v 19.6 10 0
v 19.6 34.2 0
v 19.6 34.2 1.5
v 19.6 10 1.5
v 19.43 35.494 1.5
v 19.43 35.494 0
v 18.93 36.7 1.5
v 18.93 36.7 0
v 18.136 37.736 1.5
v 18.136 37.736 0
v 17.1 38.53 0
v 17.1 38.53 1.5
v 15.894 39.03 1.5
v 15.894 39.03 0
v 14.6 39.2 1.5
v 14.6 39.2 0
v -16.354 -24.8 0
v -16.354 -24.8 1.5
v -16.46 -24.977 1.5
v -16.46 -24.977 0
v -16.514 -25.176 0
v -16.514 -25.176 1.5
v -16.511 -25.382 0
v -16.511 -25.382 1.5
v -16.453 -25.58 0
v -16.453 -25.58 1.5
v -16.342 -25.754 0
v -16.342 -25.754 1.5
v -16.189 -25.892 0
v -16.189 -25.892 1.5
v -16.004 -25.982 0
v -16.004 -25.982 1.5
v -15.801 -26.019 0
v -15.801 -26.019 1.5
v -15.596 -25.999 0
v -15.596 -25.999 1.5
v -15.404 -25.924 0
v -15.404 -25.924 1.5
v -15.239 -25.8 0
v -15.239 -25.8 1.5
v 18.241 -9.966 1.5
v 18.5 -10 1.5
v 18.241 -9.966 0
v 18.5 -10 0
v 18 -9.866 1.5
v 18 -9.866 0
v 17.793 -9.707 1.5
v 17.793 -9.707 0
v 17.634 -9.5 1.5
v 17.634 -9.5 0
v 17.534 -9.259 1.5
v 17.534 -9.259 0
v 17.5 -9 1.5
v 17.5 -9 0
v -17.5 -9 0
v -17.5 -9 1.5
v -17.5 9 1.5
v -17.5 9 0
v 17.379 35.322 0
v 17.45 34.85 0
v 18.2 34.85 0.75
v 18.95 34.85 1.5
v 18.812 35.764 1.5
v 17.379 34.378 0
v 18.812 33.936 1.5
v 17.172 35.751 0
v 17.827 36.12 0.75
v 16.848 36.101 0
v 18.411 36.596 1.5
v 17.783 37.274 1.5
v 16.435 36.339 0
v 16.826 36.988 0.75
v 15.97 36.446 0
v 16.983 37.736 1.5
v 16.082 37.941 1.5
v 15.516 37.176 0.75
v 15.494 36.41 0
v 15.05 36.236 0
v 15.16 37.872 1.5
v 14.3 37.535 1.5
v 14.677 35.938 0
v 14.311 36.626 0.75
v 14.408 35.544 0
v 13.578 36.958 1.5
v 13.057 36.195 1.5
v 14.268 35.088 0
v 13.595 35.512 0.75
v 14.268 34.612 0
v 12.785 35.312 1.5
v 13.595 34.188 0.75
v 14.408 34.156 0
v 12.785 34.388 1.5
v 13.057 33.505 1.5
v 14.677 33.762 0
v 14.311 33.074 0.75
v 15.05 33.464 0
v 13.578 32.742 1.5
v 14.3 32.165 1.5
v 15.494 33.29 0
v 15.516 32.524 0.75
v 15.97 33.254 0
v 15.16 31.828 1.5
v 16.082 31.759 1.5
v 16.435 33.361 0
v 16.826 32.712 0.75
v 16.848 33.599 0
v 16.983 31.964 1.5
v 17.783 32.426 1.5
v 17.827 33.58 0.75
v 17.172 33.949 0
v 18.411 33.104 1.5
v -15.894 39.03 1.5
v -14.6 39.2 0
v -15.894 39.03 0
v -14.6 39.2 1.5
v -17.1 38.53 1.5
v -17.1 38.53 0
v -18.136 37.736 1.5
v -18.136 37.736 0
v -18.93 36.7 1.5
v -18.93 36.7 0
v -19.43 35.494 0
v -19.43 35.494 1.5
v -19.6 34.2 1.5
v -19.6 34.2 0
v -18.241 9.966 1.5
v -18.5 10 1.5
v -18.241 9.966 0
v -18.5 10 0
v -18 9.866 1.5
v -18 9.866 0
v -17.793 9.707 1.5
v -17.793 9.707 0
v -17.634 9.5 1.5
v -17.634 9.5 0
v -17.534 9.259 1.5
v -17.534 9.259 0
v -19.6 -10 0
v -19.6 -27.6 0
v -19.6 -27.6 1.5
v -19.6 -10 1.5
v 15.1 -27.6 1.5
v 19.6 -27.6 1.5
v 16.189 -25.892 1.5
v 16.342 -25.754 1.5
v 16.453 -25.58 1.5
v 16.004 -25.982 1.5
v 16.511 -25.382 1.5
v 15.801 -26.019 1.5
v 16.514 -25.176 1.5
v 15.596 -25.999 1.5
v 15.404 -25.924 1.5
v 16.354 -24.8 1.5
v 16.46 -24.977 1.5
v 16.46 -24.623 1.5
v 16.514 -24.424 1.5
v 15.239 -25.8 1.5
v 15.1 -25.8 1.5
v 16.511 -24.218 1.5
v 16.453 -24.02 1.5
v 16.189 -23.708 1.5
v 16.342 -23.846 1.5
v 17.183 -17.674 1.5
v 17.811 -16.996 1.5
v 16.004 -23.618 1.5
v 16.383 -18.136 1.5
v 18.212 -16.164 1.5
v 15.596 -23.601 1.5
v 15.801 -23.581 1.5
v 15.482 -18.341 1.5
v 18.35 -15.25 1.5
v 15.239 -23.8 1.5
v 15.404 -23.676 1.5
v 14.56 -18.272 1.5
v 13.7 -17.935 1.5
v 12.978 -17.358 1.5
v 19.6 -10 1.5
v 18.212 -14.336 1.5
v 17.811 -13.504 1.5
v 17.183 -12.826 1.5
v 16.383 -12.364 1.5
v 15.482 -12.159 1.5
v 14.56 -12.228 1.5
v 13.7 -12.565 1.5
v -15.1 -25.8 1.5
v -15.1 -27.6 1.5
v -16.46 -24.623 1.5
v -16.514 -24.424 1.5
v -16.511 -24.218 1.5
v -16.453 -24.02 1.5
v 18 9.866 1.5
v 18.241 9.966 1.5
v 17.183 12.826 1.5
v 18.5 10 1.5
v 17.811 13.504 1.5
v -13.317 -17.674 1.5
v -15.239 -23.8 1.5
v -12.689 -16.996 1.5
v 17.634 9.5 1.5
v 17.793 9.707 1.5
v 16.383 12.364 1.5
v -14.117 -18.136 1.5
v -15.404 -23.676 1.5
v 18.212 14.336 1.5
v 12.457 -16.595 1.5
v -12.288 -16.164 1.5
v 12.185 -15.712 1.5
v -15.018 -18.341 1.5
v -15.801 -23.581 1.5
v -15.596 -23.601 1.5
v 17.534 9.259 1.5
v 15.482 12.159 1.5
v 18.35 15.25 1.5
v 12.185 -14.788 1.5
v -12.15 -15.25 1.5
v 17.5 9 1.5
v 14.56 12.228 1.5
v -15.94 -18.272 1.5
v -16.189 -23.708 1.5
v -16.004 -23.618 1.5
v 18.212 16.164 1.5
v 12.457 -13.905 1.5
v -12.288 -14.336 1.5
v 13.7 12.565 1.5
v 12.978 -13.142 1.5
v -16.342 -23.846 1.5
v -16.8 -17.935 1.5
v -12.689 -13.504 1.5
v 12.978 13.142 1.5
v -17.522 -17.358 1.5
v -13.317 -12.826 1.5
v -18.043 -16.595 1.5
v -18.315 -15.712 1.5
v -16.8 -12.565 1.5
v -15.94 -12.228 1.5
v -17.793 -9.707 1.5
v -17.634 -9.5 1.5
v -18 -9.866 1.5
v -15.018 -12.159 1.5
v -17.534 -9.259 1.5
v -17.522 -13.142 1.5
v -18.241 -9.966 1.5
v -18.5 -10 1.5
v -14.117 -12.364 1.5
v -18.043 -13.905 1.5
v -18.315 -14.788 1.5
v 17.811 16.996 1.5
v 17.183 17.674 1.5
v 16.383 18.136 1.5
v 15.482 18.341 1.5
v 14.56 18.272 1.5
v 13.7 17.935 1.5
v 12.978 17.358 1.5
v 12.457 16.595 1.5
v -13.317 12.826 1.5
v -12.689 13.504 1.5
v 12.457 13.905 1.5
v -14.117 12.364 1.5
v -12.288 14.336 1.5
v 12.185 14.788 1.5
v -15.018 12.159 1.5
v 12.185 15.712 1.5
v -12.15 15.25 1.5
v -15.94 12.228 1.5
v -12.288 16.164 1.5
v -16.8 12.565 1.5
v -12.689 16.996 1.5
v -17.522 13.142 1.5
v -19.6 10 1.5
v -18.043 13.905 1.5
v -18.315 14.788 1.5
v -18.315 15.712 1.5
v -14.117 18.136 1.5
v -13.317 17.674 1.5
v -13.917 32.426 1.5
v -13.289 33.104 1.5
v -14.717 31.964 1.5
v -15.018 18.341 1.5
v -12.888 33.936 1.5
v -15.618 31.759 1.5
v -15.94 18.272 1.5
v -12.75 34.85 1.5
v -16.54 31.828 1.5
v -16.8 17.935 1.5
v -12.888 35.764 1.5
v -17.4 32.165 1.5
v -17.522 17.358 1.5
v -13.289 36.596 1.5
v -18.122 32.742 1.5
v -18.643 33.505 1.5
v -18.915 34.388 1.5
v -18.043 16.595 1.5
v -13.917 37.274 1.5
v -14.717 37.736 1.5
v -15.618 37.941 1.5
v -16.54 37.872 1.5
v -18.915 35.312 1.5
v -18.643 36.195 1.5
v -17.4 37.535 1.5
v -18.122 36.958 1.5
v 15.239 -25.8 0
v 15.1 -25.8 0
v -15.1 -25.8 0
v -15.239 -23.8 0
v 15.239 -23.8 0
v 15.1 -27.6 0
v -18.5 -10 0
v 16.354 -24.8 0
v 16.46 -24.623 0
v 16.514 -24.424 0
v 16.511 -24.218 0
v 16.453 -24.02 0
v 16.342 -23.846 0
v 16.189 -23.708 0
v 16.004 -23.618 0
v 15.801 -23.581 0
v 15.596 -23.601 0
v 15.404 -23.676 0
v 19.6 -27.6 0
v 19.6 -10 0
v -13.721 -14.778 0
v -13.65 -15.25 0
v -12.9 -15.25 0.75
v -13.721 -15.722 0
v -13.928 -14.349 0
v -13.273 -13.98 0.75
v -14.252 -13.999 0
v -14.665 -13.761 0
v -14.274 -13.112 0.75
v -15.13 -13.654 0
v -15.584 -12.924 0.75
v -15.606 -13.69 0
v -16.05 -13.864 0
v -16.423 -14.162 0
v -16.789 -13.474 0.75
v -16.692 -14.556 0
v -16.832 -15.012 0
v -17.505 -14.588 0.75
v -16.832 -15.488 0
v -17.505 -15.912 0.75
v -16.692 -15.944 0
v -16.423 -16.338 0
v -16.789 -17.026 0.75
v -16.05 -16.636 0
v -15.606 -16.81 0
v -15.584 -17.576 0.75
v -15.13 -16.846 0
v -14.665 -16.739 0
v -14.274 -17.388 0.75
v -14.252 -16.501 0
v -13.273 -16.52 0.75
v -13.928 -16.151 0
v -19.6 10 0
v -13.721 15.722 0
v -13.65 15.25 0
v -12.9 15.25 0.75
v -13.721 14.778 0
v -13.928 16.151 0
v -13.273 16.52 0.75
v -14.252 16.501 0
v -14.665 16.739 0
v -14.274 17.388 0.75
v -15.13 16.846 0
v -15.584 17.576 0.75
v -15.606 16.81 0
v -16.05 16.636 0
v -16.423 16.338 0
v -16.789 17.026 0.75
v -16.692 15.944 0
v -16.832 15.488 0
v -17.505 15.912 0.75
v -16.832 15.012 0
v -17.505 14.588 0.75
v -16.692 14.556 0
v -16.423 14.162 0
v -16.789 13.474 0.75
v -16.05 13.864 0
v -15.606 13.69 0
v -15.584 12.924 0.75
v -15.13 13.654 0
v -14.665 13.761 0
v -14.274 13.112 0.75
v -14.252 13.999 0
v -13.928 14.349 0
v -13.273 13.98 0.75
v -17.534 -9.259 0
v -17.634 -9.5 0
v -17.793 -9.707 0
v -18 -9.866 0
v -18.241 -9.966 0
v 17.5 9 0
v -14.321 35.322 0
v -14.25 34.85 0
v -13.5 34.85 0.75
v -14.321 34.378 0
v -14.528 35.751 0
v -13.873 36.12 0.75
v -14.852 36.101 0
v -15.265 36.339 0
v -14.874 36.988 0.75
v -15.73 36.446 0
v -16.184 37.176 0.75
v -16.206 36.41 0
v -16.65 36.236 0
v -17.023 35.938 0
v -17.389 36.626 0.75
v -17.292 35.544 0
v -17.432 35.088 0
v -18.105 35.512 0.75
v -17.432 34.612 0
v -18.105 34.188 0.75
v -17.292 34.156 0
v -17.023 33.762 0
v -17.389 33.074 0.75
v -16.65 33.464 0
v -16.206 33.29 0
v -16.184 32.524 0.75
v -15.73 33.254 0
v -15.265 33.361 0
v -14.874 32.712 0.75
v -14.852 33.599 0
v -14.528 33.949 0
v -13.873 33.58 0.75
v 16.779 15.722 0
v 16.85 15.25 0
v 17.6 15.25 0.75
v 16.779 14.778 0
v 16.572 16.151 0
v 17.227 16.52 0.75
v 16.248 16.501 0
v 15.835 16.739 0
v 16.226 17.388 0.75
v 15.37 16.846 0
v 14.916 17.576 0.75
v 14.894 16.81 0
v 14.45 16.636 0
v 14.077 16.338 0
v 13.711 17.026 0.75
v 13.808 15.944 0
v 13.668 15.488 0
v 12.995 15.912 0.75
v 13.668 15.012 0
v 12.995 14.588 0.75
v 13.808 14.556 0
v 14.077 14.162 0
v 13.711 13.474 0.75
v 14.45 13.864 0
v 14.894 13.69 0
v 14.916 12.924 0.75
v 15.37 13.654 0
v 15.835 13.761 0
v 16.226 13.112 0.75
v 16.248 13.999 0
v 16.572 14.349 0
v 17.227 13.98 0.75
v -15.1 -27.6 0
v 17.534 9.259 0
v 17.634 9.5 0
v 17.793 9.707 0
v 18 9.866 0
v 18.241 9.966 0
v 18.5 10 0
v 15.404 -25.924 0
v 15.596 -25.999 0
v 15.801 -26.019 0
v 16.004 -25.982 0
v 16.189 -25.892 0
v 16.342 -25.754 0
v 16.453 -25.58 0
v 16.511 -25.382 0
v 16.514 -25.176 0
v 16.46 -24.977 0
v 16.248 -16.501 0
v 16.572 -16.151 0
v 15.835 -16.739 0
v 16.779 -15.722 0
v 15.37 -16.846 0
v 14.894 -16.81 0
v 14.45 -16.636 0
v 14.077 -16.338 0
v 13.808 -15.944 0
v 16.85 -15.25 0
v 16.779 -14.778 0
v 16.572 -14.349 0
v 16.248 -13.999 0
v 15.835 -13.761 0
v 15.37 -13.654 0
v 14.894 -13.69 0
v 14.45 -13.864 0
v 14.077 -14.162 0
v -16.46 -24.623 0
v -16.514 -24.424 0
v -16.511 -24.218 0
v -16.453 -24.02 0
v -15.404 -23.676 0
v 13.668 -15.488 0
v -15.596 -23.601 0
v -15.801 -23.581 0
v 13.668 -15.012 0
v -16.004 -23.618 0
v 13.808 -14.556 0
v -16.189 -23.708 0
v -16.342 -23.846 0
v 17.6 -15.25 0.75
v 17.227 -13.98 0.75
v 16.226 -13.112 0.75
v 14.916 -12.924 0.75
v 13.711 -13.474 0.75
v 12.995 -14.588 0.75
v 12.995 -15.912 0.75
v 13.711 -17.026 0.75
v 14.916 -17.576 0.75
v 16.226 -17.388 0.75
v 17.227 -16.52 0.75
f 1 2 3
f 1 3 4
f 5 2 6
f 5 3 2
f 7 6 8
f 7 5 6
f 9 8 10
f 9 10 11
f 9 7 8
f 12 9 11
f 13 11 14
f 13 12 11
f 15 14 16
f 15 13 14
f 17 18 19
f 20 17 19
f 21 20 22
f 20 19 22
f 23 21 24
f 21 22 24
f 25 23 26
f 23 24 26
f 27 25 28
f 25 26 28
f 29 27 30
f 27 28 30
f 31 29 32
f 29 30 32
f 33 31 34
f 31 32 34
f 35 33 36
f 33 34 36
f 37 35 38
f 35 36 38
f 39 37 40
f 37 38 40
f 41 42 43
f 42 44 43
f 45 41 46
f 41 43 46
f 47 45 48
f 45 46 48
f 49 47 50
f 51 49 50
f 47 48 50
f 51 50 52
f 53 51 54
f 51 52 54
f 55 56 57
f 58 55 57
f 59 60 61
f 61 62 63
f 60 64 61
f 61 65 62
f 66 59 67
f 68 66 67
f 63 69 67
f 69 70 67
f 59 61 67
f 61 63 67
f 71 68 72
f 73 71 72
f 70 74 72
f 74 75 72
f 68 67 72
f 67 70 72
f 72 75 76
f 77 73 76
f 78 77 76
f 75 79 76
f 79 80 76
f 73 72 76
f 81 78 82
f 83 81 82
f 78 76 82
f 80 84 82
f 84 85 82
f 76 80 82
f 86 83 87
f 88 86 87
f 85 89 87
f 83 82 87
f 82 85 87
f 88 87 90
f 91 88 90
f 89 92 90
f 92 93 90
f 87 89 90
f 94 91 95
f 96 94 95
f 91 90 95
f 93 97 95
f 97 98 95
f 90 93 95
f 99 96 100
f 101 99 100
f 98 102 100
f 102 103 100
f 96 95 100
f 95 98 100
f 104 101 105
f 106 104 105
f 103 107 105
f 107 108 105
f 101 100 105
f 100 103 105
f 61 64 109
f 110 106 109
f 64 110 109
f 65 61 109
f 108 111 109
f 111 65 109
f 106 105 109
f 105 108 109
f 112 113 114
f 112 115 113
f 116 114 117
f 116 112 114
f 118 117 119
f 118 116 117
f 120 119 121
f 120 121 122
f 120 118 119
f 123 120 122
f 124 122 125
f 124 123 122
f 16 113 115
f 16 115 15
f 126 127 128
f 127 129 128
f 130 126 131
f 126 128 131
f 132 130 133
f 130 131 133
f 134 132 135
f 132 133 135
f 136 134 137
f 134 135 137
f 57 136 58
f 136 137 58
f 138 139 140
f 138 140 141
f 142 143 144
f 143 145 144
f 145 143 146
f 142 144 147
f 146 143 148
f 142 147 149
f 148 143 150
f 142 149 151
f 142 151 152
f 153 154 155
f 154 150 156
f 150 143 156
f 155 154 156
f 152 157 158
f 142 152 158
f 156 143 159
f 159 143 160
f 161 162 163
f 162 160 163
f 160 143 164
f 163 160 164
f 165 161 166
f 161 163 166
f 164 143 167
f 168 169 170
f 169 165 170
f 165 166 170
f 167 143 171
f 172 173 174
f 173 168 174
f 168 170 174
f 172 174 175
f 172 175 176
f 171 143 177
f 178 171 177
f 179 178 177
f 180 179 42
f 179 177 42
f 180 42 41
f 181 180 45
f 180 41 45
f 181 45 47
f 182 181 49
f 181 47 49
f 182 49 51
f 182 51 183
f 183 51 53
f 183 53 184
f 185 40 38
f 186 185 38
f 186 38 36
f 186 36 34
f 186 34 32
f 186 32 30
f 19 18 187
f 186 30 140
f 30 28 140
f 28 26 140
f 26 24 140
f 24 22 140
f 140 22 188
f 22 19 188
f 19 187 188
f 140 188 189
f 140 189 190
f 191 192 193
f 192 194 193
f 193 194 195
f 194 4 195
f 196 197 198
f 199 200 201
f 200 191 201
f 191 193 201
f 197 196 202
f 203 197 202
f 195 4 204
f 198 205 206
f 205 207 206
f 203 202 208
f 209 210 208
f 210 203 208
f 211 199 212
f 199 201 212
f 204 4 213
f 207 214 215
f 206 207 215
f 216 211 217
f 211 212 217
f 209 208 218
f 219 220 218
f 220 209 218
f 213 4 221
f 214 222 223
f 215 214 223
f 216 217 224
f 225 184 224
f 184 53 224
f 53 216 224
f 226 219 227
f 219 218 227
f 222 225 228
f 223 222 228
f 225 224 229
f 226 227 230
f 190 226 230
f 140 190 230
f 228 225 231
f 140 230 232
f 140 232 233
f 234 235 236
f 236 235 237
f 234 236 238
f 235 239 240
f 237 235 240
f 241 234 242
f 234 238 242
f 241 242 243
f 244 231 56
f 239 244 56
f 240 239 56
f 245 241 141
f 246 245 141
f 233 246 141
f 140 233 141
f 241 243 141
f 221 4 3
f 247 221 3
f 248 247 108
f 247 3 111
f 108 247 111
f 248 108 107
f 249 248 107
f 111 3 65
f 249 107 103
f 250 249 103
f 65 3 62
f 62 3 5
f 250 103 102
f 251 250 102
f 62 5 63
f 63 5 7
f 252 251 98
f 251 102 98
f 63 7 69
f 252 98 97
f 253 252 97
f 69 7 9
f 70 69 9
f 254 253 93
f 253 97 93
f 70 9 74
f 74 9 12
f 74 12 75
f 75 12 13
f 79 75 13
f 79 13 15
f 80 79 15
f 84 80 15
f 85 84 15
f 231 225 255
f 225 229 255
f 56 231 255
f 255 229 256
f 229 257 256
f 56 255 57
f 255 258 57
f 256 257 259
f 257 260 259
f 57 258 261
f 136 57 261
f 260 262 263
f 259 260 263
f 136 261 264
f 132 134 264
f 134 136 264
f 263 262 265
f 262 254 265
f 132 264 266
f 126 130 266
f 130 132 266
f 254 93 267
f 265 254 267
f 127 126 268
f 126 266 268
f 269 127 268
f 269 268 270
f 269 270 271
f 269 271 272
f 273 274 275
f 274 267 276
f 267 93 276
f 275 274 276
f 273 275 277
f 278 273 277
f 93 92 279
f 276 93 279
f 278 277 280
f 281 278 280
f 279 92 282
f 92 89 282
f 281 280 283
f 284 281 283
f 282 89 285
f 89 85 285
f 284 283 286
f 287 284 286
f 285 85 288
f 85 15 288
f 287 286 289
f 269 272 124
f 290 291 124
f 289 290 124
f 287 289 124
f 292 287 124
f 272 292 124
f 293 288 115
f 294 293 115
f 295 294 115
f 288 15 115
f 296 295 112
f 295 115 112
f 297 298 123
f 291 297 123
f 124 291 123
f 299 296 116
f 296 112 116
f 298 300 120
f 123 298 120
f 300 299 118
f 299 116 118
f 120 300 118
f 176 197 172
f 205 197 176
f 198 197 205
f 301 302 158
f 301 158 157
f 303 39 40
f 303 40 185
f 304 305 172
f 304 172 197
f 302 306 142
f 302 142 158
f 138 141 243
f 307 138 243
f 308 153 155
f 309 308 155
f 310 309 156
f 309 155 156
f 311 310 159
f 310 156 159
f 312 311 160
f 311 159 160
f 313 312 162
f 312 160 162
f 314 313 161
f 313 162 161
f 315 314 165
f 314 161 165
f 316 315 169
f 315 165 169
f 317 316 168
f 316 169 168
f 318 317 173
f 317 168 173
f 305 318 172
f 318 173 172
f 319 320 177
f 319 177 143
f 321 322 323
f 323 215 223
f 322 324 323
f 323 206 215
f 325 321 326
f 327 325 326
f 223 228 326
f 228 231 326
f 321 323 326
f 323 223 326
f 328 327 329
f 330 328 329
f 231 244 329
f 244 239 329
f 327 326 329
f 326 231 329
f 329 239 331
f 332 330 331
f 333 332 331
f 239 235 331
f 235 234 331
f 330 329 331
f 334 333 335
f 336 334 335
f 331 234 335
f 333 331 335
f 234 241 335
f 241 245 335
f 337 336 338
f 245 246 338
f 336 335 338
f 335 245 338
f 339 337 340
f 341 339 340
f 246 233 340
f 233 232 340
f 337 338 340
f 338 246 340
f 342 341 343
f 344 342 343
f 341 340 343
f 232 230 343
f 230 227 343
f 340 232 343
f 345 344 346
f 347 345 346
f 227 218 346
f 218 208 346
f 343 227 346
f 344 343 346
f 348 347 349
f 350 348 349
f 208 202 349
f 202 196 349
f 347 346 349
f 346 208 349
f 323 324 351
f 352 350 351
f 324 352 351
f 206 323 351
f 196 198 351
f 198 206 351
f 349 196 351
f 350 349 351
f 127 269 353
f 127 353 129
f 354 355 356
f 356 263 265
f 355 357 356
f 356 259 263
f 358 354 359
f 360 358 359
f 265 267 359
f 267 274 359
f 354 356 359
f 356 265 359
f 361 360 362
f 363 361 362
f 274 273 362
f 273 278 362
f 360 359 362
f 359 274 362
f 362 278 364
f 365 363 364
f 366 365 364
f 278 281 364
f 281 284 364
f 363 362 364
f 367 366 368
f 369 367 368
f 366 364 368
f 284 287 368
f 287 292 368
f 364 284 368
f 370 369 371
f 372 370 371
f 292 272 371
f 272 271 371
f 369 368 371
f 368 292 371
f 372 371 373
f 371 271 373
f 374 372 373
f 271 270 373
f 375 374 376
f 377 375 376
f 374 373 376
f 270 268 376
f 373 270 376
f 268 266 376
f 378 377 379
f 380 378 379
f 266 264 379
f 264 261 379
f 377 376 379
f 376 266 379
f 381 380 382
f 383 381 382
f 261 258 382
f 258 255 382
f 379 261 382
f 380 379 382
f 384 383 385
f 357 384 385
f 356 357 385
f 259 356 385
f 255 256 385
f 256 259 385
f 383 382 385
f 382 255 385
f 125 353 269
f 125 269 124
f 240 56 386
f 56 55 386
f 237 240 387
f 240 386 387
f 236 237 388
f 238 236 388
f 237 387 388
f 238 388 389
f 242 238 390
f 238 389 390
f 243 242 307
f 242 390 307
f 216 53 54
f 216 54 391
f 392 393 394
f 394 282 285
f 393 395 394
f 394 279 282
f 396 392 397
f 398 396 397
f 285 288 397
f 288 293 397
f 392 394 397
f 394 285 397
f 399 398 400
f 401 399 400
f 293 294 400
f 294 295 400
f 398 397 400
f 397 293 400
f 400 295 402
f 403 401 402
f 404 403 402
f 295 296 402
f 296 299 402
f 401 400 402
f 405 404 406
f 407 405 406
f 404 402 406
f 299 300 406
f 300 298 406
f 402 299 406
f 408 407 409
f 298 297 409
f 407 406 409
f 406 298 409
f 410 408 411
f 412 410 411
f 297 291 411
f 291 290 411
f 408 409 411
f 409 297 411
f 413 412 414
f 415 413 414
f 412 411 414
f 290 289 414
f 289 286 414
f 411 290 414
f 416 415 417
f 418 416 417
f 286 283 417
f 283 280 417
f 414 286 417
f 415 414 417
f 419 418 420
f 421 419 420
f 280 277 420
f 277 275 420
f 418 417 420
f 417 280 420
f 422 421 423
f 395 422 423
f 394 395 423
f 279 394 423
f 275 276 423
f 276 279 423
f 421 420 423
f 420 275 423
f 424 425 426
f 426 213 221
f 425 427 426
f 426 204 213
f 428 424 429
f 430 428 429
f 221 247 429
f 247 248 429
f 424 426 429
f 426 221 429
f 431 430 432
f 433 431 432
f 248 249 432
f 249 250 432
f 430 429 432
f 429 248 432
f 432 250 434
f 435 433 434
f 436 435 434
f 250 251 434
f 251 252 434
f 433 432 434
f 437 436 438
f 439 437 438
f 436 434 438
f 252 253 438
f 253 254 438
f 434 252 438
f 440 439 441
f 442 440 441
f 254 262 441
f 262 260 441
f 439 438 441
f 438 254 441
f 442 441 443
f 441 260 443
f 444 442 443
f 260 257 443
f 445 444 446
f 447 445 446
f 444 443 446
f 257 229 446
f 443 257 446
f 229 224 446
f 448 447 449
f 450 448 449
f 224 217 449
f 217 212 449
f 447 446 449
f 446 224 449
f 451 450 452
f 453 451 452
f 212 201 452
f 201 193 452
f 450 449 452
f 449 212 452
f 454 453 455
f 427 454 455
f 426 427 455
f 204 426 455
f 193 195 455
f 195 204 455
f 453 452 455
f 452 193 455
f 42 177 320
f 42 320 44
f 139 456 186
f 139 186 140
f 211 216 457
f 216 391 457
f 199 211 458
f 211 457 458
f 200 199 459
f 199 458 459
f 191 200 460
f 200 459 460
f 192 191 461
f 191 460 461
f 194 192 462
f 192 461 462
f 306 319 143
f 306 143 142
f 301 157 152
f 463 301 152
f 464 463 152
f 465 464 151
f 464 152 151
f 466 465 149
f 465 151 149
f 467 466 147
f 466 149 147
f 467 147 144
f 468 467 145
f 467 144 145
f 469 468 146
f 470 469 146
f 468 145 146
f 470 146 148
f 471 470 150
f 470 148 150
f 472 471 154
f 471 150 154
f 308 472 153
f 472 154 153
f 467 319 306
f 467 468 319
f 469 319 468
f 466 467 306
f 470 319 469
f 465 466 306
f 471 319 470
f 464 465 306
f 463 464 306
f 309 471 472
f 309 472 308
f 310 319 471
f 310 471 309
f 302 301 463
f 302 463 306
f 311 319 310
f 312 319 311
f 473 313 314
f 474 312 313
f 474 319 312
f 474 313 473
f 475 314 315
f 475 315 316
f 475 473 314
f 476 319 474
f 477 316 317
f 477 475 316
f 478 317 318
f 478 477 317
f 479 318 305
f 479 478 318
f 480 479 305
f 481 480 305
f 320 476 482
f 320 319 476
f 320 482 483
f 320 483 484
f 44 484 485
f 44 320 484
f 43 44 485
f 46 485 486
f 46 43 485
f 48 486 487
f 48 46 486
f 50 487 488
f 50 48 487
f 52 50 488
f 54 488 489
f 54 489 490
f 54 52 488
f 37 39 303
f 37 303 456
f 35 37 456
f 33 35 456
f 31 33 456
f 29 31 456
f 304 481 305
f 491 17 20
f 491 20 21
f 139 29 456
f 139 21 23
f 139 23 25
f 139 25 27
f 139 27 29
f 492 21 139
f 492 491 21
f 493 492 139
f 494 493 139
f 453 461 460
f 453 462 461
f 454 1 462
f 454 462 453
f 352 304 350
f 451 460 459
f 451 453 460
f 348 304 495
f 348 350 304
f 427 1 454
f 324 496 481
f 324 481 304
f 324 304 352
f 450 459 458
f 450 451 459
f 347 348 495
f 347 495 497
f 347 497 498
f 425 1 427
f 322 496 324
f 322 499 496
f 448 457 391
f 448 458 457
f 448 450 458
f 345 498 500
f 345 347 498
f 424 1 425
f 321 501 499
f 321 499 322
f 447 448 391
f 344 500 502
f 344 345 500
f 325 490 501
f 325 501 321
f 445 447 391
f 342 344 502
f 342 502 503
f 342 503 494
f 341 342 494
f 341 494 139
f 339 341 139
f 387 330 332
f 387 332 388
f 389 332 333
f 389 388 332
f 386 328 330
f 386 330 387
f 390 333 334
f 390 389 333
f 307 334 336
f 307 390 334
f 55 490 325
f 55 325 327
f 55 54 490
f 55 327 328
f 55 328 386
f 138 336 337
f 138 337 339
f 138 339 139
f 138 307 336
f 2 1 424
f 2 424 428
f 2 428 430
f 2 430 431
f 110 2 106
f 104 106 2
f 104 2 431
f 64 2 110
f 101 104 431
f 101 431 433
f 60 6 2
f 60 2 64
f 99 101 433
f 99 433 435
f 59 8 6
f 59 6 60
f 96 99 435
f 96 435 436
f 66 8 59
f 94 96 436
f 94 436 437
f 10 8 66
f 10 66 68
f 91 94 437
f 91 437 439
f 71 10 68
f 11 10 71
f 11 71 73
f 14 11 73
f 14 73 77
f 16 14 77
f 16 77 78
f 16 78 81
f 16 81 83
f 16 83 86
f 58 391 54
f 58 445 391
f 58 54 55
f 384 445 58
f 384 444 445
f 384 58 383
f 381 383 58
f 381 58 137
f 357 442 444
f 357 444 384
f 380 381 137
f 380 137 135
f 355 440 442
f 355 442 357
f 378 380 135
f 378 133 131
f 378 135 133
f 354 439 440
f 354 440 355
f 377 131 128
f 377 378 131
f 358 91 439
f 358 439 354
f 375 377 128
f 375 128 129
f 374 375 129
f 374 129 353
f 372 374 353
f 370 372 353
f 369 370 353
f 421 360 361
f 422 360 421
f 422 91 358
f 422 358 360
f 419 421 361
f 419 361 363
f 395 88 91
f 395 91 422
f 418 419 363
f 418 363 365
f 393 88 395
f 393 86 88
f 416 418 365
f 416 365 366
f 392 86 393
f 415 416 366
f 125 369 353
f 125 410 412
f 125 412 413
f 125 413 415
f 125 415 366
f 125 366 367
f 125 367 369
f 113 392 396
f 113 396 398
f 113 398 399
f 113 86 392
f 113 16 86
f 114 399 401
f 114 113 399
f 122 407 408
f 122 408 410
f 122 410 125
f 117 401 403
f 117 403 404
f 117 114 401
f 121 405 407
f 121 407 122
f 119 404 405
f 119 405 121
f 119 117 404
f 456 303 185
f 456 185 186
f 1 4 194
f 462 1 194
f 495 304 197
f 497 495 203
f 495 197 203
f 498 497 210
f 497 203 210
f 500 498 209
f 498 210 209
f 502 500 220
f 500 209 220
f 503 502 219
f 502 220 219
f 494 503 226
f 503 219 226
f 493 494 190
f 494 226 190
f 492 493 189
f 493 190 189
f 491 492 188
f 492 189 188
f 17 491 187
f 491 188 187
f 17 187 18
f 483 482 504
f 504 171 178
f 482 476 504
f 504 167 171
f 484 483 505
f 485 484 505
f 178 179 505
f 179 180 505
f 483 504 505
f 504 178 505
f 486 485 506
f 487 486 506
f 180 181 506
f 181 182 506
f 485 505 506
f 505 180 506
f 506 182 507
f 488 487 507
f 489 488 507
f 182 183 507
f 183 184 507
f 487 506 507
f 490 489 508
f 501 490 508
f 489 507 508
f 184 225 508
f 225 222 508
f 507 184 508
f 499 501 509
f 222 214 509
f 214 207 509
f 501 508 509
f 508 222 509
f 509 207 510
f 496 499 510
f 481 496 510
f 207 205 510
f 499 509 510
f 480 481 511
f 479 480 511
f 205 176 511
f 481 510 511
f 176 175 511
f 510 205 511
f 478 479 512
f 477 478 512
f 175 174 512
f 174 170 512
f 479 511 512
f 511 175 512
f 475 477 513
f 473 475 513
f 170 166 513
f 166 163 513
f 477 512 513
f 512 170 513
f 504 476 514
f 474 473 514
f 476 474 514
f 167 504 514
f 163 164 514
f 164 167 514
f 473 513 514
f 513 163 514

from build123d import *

# Parameters (mm, degrees)
BASE_DEPTH                                 = 1.5
BATTERY_STRAP_CUT_REACH                    = 45.853
SKETCH3_W                                  = 2.1
SKETCH3_H                                  = 20
BATTERY_STRAP_FILLET_R                     = 1
BATTERY_STRAP_FILLET_OF_BATTERY_STRAP_OT_R = 1
FILLET2_R                                  = 5
HOLE_CUT_REACH                             = 45.853
SKETCH2_R                                  = 1.6
BOLT_HEAD_CHAMBER_SIZE                     = 1.5
SKETCH4_R                                  = 0.75
MILLING_HOLES_DEPTH                        = 10


with BuildPart() as part:
    # Sketch1 → Base (new body)
    with BuildSketch(Plane.XY):
        Polygon((-19.6, 39.2), (19.6, 39.2), (19.6, -27.6), (15.1, -27.6), (15.1, -25.8), (16.3, -25.8), (16.3, -23.8), (-16.3, -23.8), (-16.3, -25.8), (-15.1, -25.8), (-15.1, -27.6), (-19.6, -27.6), align=None)
    extrude(amount=BASE_DEPTH)

    # Sketch3 → Battery strap cut (cut, up to next)
    with BuildSketch(Plane.XY.offset(1.5), mode=Mode.PRIVATE) as battery_strap_cut_sk1:
        with Locations((-18.55, 0)):
            Rectangle(SKETCH3_W, SKETCH3_H)
    battery_strap_cut_tool1 = extrude(battery_strap_cut_sk1.sketch, amount=-BATTERY_STRAP_CUT_REACH, mode=Mode.PRIVATE) & part.part
    battery_strap_cut = battery_strap_cut_tool1.solids().sort_by_distance((-18.55, 0, 1.5))[0]
    add(battery_strap_cut, mode=Mode.SUBTRACT)

    # Battery strap fillet
    battery_strap_fillet_edges = [part.edges().sort_by_distance(p)[0] for p in [
        (-17.5, 10, 0.75),
        (-17.5, -10, 0.75),
    ]]
    fillet(battery_strap_fillet_edges, radius=BATTERY_STRAP_FILLET_R)

    # Battery strap other side: Battery strap cut across plane
    add(battery_strap_cut.mirror(Plane(origin=(0, 0, 0), x_dir=(0, 0, 1), z_dir=(1, 0, 0))), mode=Mode.SUBTRACT)

    # Battery strap fillet of Battery strap ot
    battery_strap_fillet_of_battery_strap_ot_edges = [part.edges().sort_by_distance(p)[0] for p in [
        (17.5, 10, 0.75),
        (17.5, -10, 0.75),
    ]]
    fillet(battery_strap_fillet_of_battery_strap_ot_edges, radius=BATTERY_STRAP_FILLET_OF_BATTERY_STRAP_OT_R)

    # Fillet2
    fillet2_edges = [part.edges().sort_by_distance(p)[0] for p in [
        (-19.6, 39.2, 0.75),
        (19.6, 39.2, 0.75),
    ]]
    fillet(fillet2_edges, radius=FILLET2_R)

    # Sketch2 → Hole cut (cut, up to next)
    with BuildSketch(Plane.XY.offset(1.5), mode=Mode.PRIVATE) as hole_cut_sk1:
        with Locations((-15.25, 15.25)):
            Circle(SKETCH2_R)
    hole_cut_tool1 = extrude(hole_cut_sk1.sketch, amount=-HOLE_CUT_REACH, mode=Mode.PRIVATE) & part.part
    # Sketch2 → Hole cut (cut, up to next)
    with BuildSketch(Plane.XY.offset(1.5), mode=Mode.PRIVATE) as hole_cut_sk2:
        with Locations((-15.85, 34.85)):
            Circle(SKETCH2_R)
    hole_cut_tool2 = extrude(hole_cut_sk2.sketch, amount=-HOLE_CUT_REACH, mode=Mode.PRIVATE) & part.part
    # Sketch2 → Hole cut (cut, up to next)
    with BuildSketch(Plane.XY.offset(1.5), mode=Mode.PRIVATE) as hole_cut_sk3:
        with Locations((15.85, 34.85)):
            Circle(SKETCH2_R)
    hole_cut_tool3 = extrude(hole_cut_sk3.sketch, amount=-HOLE_CUT_REACH, mode=Mode.PRIVATE) & part.part
    # Sketch2 → Hole cut (cut, up to next)
    with BuildSketch(Plane.XY.offset(1.5), mode=Mode.PRIVATE) as hole_cut_sk4:
        with Locations((15.25, 15.25)):
            Circle(SKETCH2_R)
    hole_cut_tool4 = extrude(hole_cut_sk4.sketch, amount=-HOLE_CUT_REACH, mode=Mode.PRIVATE) & part.part
    # Sketch2 → Hole cut (cut, up to next)
    with BuildSketch(Plane.XY.offset(1.5), mode=Mode.PRIVATE) as hole_cut_sk5:
        with Locations((15.25, -15.25)):
            Circle(SKETCH2_R)
    hole_cut_tool5 = extrude(hole_cut_sk5.sketch, amount=-HOLE_CUT_REACH, mode=Mode.PRIVATE) & part.part
    # Sketch2 → Hole cut (cut, up to next)
    with BuildSketch(Plane.XY.offset(1.5), mode=Mode.PRIVATE) as hole_cut_sk6:
        with Locations((-15.25, -15.25)):
            Circle(SKETCH2_R)
    hole_cut_tool6 = extrude(hole_cut_sk6.sketch, amount=-HOLE_CUT_REACH, mode=Mode.PRIVATE) & part.part
    add(hole_cut_tool1.solids().sort_by_distance((-15.25, 15.25, 1.5))[0], mode=Mode.SUBTRACT)
    add(hole_cut_tool2.solids().sort_by_distance((-15.85, 34.85, 1.5))[0], mode=Mode.SUBTRACT)
    add(hole_cut_tool3.solids().sort_by_distance((15.85, 34.85, 1.5))[0], mode=Mode.SUBTRACT)
    add(hole_cut_tool4.solids().sort_by_distance((15.25, 15.25, 1.5))[0], mode=Mode.SUBTRACT)
    add(hole_cut_tool5.solids().sort_by_distance((15.25, -15.25, 1.5))[0], mode=Mode.SUBTRACT)
    add(hole_cut_tool6.solids().sort_by_distance((-15.25, -15.25, 1.5))[0], mode=Mode.SUBTRACT)

    # Bolt head chamber
    bolt_head_chamber_edges = [part.edges().sort_by_distance(p)[0] for p in [
        (-16.85, 15.25, 1.5),
        (-17.45, 34.85, 1.5),
        (14.25, 34.85, 1.5),
        (13.65, 15.25, 1.5),
        (13.65, -15.25, 1.5),
        (-16.85, -15.25, 1.5),
    ]]
    chamfer(bolt_head_chamber_edges, length=BOLT_HEAD_CHAMBER_SIZE - 0.0001)  # a hair under: the kernel refuses the full size

    # Sketch4 → Milling holes (cut)
    with BuildSketch(Plane.XY.offset(1.5)):
        with Locations((-15.769669914, -24.330330086)):
            Circle(SKETCH4_R)
        with Locations((-15.769669914, -25.269669914)):
            Circle(SKETCH4_R)
        with Locations((15.769669914, -25.269669914)):
            Circle(SKETCH4_R)
        with Locations((15.769669914, -24.330330086)):
            Circle(SKETCH4_R)
    extrude(amount=-MILLING_HOLES_DEPTH, mode=Mode.SUBTRACT)


solid = part.part
